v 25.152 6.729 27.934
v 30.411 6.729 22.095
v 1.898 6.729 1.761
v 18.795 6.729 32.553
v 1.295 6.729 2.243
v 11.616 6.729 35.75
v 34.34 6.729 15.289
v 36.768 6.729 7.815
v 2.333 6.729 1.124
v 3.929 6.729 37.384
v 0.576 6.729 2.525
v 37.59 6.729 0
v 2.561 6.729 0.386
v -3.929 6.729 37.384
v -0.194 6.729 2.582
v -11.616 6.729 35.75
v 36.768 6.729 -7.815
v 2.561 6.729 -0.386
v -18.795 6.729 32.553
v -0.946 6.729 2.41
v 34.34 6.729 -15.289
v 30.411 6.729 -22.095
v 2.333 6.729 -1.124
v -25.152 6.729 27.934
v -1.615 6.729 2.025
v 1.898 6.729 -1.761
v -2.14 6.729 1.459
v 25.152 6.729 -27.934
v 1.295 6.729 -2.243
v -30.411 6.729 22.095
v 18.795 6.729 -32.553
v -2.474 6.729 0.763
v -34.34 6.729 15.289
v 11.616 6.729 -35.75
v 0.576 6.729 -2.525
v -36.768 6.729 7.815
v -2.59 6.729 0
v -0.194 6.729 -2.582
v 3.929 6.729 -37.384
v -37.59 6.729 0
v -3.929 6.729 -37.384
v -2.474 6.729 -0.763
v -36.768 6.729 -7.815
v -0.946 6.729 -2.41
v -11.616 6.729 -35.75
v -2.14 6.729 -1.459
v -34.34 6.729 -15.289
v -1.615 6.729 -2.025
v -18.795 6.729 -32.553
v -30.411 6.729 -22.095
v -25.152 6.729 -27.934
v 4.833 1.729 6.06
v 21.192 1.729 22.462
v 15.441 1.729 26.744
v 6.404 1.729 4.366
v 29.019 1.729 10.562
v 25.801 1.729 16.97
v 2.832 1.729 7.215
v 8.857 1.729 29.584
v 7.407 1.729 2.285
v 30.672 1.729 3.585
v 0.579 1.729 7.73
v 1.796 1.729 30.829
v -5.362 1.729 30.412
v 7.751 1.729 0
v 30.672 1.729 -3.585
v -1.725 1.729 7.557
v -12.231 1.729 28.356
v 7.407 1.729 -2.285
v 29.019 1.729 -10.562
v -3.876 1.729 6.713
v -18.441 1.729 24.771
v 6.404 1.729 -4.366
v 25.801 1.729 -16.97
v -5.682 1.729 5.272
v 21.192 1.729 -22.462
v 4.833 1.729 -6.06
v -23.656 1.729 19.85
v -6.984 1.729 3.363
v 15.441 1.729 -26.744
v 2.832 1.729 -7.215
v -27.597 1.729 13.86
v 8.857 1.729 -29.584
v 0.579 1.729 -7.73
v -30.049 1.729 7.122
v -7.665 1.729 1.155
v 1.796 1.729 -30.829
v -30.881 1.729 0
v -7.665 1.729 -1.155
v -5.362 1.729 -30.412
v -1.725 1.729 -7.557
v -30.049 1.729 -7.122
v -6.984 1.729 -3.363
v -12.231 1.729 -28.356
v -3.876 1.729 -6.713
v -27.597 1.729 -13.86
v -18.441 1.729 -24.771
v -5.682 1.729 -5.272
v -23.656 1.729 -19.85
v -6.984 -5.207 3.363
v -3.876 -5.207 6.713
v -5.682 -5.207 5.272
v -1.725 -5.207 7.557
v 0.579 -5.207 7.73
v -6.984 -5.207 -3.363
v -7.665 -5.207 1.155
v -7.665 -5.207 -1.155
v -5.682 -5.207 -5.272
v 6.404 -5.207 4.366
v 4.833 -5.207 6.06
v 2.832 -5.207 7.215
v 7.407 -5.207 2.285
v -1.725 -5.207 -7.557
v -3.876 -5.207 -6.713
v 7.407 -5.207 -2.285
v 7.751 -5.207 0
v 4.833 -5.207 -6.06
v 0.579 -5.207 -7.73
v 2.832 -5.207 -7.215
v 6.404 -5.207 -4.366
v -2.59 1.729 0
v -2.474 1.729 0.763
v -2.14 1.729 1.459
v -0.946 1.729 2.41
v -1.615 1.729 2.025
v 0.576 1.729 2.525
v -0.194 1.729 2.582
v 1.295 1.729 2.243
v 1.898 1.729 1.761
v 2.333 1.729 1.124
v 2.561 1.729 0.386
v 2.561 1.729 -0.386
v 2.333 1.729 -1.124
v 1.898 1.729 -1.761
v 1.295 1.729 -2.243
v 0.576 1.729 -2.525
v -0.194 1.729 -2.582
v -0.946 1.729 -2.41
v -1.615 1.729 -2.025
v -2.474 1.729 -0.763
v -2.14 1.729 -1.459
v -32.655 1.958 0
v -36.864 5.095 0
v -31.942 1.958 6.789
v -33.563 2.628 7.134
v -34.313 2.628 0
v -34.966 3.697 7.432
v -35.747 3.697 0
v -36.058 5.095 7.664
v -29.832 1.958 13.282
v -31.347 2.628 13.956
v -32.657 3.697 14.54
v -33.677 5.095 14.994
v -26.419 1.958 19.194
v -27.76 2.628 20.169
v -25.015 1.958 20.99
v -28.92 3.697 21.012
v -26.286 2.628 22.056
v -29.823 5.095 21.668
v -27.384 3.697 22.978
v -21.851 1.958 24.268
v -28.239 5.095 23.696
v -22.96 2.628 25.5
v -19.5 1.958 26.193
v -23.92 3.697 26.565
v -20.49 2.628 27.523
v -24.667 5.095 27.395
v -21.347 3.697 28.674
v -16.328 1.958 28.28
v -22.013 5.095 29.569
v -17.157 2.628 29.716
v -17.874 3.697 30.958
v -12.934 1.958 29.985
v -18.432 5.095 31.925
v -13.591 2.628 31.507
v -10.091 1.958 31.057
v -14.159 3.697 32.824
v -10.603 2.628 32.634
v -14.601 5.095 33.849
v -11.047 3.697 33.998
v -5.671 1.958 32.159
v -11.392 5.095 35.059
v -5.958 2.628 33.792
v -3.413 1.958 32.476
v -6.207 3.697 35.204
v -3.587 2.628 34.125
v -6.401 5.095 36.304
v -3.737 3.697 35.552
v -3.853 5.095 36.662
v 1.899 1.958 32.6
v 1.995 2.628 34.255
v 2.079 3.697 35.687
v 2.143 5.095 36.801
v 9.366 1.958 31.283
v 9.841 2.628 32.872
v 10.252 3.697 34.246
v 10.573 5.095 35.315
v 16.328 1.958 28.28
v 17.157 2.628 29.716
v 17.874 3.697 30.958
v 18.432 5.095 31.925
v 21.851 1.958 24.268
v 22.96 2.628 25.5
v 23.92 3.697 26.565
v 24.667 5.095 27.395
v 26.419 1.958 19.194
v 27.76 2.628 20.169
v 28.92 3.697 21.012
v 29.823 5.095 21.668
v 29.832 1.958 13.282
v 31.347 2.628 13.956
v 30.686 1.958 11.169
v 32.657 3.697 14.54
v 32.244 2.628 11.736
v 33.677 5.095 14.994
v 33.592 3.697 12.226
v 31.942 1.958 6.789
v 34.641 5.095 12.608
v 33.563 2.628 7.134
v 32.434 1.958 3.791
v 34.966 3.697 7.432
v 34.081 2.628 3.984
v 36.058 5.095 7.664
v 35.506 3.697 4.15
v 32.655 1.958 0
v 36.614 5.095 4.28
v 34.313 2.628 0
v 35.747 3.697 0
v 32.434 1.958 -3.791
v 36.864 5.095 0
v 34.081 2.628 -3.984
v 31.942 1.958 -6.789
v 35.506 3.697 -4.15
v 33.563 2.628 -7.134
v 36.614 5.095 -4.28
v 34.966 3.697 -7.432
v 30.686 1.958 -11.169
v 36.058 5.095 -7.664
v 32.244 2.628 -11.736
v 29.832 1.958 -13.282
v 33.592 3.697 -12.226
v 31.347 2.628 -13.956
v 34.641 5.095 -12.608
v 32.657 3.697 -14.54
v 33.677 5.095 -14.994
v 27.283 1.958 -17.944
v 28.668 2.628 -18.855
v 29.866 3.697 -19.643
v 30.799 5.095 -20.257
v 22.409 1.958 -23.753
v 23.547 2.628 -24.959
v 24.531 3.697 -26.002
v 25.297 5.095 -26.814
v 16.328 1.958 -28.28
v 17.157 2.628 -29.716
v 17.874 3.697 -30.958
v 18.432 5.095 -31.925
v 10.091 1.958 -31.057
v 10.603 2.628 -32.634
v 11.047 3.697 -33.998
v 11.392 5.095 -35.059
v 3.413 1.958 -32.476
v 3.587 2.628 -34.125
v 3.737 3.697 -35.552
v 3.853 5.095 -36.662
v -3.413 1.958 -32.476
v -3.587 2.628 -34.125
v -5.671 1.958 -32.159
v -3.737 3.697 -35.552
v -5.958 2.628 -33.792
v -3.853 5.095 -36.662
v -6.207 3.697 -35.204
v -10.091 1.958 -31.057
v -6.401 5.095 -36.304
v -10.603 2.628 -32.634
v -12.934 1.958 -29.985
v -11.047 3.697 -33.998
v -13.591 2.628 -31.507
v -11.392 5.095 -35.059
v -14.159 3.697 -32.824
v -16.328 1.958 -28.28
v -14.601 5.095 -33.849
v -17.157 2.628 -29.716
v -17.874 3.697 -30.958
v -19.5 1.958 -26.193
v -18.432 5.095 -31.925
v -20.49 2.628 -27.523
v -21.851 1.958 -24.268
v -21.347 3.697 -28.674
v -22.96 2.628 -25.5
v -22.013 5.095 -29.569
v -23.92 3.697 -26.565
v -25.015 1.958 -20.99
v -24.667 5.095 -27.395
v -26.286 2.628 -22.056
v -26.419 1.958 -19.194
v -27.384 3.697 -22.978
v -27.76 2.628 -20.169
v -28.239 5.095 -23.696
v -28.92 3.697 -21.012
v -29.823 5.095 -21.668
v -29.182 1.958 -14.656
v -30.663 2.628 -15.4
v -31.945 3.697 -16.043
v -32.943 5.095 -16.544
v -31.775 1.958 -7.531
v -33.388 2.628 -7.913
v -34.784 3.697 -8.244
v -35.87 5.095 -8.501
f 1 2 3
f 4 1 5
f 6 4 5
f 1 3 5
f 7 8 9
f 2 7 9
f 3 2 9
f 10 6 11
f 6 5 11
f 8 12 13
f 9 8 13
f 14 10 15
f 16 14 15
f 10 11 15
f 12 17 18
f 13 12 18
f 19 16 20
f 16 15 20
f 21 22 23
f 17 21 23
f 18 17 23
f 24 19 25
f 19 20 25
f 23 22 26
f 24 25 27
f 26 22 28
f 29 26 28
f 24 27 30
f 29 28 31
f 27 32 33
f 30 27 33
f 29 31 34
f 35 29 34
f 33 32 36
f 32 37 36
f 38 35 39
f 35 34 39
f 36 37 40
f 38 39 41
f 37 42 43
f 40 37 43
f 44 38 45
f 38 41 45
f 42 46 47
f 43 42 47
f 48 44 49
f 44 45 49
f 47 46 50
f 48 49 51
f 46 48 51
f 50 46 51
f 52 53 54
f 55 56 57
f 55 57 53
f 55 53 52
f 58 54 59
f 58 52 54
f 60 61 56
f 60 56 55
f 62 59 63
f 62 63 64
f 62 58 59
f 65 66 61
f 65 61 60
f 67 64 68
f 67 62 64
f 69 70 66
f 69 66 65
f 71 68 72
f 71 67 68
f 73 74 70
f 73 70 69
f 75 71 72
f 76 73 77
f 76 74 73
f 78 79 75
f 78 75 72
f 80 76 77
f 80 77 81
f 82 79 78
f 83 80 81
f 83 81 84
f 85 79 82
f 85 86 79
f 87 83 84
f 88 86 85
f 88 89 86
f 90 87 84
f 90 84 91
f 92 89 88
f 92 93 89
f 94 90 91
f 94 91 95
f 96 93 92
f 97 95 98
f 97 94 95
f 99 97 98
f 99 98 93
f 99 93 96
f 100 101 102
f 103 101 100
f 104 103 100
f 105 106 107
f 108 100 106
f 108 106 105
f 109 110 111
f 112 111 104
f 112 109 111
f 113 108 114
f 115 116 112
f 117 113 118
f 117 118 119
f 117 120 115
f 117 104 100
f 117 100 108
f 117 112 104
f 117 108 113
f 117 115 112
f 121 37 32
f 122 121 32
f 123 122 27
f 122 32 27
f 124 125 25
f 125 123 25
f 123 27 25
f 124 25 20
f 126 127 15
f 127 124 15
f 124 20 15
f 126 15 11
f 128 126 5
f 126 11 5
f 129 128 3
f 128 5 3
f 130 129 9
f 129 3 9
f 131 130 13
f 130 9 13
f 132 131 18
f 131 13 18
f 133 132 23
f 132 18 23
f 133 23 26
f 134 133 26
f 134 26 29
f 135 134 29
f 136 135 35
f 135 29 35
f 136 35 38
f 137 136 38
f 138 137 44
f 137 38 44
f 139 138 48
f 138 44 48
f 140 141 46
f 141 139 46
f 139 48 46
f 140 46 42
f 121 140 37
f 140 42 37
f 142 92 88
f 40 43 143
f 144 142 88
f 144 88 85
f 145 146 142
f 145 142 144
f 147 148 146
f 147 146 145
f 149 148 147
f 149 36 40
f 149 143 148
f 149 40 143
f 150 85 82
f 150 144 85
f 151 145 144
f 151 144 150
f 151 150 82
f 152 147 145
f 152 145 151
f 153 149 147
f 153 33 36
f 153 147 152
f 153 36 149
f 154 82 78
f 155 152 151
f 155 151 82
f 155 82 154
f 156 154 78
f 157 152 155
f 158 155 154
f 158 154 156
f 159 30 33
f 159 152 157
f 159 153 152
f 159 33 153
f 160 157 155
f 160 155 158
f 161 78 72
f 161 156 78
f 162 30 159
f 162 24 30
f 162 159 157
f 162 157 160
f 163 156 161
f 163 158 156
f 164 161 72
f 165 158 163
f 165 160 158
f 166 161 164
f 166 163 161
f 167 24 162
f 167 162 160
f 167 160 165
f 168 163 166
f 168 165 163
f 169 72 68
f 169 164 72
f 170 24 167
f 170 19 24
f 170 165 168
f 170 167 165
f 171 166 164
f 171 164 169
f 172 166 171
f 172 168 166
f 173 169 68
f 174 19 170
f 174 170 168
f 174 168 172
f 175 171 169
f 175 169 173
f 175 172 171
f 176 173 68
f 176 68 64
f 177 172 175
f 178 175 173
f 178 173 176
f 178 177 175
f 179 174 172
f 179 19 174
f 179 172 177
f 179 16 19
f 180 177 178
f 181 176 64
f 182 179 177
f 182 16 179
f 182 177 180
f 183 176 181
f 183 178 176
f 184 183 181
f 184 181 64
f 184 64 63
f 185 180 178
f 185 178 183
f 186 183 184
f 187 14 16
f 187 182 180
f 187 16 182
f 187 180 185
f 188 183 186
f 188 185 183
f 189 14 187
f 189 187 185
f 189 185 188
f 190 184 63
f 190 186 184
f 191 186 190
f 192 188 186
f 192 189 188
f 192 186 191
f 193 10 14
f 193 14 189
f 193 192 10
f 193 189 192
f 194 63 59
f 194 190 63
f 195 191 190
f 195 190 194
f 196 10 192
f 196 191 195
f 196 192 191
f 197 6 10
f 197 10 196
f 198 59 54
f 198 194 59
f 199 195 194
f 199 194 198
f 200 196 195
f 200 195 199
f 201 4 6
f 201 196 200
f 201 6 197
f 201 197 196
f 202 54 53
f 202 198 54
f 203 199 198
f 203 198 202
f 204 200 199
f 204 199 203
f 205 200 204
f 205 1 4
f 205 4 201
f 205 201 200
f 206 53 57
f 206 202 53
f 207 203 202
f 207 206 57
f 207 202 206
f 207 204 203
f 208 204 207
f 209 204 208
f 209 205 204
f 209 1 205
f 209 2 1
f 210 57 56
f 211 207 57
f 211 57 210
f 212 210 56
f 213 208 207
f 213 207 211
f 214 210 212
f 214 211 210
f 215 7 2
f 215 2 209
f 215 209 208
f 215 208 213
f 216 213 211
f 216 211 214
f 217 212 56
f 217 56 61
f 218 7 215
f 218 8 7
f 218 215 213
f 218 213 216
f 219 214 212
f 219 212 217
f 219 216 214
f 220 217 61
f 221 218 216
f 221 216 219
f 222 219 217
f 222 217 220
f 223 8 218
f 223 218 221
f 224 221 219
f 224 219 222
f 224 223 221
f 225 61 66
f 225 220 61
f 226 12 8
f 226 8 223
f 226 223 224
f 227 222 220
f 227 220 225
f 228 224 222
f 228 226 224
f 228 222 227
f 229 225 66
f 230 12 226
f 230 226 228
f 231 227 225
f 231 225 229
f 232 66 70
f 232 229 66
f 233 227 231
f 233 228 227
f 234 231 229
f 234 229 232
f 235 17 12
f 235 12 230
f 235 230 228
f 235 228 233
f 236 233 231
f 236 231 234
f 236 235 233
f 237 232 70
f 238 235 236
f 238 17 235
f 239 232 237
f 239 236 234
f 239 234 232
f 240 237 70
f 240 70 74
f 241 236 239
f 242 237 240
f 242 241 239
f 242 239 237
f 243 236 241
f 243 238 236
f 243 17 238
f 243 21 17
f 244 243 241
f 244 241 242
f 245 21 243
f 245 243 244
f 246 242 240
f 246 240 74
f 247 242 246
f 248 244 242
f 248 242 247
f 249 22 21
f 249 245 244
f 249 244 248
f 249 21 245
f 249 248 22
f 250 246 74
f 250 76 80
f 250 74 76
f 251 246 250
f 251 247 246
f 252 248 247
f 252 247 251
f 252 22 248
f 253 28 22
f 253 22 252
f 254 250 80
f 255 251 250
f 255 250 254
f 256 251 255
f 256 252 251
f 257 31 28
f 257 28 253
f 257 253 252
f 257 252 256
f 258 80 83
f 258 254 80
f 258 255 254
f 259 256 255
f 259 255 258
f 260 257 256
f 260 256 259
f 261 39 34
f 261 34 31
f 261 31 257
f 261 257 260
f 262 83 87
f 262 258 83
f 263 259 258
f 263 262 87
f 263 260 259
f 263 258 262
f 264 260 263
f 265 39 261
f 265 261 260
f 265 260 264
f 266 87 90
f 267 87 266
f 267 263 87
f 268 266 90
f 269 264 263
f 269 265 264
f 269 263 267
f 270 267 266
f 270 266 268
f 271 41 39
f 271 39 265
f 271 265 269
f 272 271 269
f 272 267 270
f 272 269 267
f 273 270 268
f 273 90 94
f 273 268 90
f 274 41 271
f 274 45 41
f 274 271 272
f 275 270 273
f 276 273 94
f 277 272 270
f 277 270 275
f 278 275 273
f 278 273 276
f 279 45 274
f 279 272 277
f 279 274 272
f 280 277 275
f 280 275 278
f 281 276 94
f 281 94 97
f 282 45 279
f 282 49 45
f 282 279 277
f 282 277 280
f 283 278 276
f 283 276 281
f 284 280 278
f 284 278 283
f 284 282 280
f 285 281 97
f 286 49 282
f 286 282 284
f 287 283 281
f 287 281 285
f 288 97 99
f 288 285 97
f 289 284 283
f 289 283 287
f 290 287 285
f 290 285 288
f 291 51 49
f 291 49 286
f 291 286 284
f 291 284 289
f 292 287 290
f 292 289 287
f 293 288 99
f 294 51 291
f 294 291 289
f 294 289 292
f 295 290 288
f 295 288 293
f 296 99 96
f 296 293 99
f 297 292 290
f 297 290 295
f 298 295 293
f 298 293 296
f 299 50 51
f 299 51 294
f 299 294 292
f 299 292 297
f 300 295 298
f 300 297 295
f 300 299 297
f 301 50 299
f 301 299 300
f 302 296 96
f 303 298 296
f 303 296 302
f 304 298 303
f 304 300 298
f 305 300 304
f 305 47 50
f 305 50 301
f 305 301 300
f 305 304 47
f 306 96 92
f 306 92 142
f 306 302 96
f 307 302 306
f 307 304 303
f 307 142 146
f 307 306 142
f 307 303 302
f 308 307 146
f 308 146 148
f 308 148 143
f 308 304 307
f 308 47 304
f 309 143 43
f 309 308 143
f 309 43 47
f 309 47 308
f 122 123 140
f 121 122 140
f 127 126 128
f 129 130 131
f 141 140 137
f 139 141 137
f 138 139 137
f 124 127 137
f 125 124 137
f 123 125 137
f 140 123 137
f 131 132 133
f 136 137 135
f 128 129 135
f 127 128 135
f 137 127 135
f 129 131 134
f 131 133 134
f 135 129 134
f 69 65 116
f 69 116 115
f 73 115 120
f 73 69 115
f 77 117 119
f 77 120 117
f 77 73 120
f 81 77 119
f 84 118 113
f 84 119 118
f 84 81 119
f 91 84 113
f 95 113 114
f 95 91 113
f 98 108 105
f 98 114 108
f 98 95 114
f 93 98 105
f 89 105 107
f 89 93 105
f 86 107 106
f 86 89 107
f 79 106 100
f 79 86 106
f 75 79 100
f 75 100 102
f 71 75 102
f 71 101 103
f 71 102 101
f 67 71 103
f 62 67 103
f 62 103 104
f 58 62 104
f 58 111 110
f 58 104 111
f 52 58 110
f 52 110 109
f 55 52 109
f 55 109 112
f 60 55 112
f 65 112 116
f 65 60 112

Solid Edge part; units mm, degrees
sketch "Sketch1" plane through (0, 0, 0) normal (0, 0, 1) x (1, 0, 0)
  line L0 (-37.5895, 1.7294) -> (-2.5895, 1.7294)
  line L1 (-2.5895, 1.7294) -> (-2.5895, 6.7294)
  line L2 (-2.5895, 6.7294) -> (-37.5895, 6.7294)
  line L3 (-37.5895, 6.7294) -> (-37.5895, 1.7294)
  dimension "D1" = 35
  dimension "D2" = 5
revolve "RevolvedProtrusion1" add sketch "Sketch1" angle 360 about axis through (0, 54, 0) along (0, -1, 0)
fillet "Round1" radius 7 1 edges at (-37.5895, 1.7294, 0)
sketch "Sketch2" plane through (0, 1.7294, 0) normal (0, -1, 0) x (1, 0, 0)
  circle A0 centre (0, 0) radius 7.7513
  dimension "D1" = 15.5027
extrude "ExtrudedProtrusion_1" add sketch "Sketch2" along normal blind 6.9361
properties material "Aluminum Alloy:3.1255, AlCu4SiMg, EN-AW 2014"
